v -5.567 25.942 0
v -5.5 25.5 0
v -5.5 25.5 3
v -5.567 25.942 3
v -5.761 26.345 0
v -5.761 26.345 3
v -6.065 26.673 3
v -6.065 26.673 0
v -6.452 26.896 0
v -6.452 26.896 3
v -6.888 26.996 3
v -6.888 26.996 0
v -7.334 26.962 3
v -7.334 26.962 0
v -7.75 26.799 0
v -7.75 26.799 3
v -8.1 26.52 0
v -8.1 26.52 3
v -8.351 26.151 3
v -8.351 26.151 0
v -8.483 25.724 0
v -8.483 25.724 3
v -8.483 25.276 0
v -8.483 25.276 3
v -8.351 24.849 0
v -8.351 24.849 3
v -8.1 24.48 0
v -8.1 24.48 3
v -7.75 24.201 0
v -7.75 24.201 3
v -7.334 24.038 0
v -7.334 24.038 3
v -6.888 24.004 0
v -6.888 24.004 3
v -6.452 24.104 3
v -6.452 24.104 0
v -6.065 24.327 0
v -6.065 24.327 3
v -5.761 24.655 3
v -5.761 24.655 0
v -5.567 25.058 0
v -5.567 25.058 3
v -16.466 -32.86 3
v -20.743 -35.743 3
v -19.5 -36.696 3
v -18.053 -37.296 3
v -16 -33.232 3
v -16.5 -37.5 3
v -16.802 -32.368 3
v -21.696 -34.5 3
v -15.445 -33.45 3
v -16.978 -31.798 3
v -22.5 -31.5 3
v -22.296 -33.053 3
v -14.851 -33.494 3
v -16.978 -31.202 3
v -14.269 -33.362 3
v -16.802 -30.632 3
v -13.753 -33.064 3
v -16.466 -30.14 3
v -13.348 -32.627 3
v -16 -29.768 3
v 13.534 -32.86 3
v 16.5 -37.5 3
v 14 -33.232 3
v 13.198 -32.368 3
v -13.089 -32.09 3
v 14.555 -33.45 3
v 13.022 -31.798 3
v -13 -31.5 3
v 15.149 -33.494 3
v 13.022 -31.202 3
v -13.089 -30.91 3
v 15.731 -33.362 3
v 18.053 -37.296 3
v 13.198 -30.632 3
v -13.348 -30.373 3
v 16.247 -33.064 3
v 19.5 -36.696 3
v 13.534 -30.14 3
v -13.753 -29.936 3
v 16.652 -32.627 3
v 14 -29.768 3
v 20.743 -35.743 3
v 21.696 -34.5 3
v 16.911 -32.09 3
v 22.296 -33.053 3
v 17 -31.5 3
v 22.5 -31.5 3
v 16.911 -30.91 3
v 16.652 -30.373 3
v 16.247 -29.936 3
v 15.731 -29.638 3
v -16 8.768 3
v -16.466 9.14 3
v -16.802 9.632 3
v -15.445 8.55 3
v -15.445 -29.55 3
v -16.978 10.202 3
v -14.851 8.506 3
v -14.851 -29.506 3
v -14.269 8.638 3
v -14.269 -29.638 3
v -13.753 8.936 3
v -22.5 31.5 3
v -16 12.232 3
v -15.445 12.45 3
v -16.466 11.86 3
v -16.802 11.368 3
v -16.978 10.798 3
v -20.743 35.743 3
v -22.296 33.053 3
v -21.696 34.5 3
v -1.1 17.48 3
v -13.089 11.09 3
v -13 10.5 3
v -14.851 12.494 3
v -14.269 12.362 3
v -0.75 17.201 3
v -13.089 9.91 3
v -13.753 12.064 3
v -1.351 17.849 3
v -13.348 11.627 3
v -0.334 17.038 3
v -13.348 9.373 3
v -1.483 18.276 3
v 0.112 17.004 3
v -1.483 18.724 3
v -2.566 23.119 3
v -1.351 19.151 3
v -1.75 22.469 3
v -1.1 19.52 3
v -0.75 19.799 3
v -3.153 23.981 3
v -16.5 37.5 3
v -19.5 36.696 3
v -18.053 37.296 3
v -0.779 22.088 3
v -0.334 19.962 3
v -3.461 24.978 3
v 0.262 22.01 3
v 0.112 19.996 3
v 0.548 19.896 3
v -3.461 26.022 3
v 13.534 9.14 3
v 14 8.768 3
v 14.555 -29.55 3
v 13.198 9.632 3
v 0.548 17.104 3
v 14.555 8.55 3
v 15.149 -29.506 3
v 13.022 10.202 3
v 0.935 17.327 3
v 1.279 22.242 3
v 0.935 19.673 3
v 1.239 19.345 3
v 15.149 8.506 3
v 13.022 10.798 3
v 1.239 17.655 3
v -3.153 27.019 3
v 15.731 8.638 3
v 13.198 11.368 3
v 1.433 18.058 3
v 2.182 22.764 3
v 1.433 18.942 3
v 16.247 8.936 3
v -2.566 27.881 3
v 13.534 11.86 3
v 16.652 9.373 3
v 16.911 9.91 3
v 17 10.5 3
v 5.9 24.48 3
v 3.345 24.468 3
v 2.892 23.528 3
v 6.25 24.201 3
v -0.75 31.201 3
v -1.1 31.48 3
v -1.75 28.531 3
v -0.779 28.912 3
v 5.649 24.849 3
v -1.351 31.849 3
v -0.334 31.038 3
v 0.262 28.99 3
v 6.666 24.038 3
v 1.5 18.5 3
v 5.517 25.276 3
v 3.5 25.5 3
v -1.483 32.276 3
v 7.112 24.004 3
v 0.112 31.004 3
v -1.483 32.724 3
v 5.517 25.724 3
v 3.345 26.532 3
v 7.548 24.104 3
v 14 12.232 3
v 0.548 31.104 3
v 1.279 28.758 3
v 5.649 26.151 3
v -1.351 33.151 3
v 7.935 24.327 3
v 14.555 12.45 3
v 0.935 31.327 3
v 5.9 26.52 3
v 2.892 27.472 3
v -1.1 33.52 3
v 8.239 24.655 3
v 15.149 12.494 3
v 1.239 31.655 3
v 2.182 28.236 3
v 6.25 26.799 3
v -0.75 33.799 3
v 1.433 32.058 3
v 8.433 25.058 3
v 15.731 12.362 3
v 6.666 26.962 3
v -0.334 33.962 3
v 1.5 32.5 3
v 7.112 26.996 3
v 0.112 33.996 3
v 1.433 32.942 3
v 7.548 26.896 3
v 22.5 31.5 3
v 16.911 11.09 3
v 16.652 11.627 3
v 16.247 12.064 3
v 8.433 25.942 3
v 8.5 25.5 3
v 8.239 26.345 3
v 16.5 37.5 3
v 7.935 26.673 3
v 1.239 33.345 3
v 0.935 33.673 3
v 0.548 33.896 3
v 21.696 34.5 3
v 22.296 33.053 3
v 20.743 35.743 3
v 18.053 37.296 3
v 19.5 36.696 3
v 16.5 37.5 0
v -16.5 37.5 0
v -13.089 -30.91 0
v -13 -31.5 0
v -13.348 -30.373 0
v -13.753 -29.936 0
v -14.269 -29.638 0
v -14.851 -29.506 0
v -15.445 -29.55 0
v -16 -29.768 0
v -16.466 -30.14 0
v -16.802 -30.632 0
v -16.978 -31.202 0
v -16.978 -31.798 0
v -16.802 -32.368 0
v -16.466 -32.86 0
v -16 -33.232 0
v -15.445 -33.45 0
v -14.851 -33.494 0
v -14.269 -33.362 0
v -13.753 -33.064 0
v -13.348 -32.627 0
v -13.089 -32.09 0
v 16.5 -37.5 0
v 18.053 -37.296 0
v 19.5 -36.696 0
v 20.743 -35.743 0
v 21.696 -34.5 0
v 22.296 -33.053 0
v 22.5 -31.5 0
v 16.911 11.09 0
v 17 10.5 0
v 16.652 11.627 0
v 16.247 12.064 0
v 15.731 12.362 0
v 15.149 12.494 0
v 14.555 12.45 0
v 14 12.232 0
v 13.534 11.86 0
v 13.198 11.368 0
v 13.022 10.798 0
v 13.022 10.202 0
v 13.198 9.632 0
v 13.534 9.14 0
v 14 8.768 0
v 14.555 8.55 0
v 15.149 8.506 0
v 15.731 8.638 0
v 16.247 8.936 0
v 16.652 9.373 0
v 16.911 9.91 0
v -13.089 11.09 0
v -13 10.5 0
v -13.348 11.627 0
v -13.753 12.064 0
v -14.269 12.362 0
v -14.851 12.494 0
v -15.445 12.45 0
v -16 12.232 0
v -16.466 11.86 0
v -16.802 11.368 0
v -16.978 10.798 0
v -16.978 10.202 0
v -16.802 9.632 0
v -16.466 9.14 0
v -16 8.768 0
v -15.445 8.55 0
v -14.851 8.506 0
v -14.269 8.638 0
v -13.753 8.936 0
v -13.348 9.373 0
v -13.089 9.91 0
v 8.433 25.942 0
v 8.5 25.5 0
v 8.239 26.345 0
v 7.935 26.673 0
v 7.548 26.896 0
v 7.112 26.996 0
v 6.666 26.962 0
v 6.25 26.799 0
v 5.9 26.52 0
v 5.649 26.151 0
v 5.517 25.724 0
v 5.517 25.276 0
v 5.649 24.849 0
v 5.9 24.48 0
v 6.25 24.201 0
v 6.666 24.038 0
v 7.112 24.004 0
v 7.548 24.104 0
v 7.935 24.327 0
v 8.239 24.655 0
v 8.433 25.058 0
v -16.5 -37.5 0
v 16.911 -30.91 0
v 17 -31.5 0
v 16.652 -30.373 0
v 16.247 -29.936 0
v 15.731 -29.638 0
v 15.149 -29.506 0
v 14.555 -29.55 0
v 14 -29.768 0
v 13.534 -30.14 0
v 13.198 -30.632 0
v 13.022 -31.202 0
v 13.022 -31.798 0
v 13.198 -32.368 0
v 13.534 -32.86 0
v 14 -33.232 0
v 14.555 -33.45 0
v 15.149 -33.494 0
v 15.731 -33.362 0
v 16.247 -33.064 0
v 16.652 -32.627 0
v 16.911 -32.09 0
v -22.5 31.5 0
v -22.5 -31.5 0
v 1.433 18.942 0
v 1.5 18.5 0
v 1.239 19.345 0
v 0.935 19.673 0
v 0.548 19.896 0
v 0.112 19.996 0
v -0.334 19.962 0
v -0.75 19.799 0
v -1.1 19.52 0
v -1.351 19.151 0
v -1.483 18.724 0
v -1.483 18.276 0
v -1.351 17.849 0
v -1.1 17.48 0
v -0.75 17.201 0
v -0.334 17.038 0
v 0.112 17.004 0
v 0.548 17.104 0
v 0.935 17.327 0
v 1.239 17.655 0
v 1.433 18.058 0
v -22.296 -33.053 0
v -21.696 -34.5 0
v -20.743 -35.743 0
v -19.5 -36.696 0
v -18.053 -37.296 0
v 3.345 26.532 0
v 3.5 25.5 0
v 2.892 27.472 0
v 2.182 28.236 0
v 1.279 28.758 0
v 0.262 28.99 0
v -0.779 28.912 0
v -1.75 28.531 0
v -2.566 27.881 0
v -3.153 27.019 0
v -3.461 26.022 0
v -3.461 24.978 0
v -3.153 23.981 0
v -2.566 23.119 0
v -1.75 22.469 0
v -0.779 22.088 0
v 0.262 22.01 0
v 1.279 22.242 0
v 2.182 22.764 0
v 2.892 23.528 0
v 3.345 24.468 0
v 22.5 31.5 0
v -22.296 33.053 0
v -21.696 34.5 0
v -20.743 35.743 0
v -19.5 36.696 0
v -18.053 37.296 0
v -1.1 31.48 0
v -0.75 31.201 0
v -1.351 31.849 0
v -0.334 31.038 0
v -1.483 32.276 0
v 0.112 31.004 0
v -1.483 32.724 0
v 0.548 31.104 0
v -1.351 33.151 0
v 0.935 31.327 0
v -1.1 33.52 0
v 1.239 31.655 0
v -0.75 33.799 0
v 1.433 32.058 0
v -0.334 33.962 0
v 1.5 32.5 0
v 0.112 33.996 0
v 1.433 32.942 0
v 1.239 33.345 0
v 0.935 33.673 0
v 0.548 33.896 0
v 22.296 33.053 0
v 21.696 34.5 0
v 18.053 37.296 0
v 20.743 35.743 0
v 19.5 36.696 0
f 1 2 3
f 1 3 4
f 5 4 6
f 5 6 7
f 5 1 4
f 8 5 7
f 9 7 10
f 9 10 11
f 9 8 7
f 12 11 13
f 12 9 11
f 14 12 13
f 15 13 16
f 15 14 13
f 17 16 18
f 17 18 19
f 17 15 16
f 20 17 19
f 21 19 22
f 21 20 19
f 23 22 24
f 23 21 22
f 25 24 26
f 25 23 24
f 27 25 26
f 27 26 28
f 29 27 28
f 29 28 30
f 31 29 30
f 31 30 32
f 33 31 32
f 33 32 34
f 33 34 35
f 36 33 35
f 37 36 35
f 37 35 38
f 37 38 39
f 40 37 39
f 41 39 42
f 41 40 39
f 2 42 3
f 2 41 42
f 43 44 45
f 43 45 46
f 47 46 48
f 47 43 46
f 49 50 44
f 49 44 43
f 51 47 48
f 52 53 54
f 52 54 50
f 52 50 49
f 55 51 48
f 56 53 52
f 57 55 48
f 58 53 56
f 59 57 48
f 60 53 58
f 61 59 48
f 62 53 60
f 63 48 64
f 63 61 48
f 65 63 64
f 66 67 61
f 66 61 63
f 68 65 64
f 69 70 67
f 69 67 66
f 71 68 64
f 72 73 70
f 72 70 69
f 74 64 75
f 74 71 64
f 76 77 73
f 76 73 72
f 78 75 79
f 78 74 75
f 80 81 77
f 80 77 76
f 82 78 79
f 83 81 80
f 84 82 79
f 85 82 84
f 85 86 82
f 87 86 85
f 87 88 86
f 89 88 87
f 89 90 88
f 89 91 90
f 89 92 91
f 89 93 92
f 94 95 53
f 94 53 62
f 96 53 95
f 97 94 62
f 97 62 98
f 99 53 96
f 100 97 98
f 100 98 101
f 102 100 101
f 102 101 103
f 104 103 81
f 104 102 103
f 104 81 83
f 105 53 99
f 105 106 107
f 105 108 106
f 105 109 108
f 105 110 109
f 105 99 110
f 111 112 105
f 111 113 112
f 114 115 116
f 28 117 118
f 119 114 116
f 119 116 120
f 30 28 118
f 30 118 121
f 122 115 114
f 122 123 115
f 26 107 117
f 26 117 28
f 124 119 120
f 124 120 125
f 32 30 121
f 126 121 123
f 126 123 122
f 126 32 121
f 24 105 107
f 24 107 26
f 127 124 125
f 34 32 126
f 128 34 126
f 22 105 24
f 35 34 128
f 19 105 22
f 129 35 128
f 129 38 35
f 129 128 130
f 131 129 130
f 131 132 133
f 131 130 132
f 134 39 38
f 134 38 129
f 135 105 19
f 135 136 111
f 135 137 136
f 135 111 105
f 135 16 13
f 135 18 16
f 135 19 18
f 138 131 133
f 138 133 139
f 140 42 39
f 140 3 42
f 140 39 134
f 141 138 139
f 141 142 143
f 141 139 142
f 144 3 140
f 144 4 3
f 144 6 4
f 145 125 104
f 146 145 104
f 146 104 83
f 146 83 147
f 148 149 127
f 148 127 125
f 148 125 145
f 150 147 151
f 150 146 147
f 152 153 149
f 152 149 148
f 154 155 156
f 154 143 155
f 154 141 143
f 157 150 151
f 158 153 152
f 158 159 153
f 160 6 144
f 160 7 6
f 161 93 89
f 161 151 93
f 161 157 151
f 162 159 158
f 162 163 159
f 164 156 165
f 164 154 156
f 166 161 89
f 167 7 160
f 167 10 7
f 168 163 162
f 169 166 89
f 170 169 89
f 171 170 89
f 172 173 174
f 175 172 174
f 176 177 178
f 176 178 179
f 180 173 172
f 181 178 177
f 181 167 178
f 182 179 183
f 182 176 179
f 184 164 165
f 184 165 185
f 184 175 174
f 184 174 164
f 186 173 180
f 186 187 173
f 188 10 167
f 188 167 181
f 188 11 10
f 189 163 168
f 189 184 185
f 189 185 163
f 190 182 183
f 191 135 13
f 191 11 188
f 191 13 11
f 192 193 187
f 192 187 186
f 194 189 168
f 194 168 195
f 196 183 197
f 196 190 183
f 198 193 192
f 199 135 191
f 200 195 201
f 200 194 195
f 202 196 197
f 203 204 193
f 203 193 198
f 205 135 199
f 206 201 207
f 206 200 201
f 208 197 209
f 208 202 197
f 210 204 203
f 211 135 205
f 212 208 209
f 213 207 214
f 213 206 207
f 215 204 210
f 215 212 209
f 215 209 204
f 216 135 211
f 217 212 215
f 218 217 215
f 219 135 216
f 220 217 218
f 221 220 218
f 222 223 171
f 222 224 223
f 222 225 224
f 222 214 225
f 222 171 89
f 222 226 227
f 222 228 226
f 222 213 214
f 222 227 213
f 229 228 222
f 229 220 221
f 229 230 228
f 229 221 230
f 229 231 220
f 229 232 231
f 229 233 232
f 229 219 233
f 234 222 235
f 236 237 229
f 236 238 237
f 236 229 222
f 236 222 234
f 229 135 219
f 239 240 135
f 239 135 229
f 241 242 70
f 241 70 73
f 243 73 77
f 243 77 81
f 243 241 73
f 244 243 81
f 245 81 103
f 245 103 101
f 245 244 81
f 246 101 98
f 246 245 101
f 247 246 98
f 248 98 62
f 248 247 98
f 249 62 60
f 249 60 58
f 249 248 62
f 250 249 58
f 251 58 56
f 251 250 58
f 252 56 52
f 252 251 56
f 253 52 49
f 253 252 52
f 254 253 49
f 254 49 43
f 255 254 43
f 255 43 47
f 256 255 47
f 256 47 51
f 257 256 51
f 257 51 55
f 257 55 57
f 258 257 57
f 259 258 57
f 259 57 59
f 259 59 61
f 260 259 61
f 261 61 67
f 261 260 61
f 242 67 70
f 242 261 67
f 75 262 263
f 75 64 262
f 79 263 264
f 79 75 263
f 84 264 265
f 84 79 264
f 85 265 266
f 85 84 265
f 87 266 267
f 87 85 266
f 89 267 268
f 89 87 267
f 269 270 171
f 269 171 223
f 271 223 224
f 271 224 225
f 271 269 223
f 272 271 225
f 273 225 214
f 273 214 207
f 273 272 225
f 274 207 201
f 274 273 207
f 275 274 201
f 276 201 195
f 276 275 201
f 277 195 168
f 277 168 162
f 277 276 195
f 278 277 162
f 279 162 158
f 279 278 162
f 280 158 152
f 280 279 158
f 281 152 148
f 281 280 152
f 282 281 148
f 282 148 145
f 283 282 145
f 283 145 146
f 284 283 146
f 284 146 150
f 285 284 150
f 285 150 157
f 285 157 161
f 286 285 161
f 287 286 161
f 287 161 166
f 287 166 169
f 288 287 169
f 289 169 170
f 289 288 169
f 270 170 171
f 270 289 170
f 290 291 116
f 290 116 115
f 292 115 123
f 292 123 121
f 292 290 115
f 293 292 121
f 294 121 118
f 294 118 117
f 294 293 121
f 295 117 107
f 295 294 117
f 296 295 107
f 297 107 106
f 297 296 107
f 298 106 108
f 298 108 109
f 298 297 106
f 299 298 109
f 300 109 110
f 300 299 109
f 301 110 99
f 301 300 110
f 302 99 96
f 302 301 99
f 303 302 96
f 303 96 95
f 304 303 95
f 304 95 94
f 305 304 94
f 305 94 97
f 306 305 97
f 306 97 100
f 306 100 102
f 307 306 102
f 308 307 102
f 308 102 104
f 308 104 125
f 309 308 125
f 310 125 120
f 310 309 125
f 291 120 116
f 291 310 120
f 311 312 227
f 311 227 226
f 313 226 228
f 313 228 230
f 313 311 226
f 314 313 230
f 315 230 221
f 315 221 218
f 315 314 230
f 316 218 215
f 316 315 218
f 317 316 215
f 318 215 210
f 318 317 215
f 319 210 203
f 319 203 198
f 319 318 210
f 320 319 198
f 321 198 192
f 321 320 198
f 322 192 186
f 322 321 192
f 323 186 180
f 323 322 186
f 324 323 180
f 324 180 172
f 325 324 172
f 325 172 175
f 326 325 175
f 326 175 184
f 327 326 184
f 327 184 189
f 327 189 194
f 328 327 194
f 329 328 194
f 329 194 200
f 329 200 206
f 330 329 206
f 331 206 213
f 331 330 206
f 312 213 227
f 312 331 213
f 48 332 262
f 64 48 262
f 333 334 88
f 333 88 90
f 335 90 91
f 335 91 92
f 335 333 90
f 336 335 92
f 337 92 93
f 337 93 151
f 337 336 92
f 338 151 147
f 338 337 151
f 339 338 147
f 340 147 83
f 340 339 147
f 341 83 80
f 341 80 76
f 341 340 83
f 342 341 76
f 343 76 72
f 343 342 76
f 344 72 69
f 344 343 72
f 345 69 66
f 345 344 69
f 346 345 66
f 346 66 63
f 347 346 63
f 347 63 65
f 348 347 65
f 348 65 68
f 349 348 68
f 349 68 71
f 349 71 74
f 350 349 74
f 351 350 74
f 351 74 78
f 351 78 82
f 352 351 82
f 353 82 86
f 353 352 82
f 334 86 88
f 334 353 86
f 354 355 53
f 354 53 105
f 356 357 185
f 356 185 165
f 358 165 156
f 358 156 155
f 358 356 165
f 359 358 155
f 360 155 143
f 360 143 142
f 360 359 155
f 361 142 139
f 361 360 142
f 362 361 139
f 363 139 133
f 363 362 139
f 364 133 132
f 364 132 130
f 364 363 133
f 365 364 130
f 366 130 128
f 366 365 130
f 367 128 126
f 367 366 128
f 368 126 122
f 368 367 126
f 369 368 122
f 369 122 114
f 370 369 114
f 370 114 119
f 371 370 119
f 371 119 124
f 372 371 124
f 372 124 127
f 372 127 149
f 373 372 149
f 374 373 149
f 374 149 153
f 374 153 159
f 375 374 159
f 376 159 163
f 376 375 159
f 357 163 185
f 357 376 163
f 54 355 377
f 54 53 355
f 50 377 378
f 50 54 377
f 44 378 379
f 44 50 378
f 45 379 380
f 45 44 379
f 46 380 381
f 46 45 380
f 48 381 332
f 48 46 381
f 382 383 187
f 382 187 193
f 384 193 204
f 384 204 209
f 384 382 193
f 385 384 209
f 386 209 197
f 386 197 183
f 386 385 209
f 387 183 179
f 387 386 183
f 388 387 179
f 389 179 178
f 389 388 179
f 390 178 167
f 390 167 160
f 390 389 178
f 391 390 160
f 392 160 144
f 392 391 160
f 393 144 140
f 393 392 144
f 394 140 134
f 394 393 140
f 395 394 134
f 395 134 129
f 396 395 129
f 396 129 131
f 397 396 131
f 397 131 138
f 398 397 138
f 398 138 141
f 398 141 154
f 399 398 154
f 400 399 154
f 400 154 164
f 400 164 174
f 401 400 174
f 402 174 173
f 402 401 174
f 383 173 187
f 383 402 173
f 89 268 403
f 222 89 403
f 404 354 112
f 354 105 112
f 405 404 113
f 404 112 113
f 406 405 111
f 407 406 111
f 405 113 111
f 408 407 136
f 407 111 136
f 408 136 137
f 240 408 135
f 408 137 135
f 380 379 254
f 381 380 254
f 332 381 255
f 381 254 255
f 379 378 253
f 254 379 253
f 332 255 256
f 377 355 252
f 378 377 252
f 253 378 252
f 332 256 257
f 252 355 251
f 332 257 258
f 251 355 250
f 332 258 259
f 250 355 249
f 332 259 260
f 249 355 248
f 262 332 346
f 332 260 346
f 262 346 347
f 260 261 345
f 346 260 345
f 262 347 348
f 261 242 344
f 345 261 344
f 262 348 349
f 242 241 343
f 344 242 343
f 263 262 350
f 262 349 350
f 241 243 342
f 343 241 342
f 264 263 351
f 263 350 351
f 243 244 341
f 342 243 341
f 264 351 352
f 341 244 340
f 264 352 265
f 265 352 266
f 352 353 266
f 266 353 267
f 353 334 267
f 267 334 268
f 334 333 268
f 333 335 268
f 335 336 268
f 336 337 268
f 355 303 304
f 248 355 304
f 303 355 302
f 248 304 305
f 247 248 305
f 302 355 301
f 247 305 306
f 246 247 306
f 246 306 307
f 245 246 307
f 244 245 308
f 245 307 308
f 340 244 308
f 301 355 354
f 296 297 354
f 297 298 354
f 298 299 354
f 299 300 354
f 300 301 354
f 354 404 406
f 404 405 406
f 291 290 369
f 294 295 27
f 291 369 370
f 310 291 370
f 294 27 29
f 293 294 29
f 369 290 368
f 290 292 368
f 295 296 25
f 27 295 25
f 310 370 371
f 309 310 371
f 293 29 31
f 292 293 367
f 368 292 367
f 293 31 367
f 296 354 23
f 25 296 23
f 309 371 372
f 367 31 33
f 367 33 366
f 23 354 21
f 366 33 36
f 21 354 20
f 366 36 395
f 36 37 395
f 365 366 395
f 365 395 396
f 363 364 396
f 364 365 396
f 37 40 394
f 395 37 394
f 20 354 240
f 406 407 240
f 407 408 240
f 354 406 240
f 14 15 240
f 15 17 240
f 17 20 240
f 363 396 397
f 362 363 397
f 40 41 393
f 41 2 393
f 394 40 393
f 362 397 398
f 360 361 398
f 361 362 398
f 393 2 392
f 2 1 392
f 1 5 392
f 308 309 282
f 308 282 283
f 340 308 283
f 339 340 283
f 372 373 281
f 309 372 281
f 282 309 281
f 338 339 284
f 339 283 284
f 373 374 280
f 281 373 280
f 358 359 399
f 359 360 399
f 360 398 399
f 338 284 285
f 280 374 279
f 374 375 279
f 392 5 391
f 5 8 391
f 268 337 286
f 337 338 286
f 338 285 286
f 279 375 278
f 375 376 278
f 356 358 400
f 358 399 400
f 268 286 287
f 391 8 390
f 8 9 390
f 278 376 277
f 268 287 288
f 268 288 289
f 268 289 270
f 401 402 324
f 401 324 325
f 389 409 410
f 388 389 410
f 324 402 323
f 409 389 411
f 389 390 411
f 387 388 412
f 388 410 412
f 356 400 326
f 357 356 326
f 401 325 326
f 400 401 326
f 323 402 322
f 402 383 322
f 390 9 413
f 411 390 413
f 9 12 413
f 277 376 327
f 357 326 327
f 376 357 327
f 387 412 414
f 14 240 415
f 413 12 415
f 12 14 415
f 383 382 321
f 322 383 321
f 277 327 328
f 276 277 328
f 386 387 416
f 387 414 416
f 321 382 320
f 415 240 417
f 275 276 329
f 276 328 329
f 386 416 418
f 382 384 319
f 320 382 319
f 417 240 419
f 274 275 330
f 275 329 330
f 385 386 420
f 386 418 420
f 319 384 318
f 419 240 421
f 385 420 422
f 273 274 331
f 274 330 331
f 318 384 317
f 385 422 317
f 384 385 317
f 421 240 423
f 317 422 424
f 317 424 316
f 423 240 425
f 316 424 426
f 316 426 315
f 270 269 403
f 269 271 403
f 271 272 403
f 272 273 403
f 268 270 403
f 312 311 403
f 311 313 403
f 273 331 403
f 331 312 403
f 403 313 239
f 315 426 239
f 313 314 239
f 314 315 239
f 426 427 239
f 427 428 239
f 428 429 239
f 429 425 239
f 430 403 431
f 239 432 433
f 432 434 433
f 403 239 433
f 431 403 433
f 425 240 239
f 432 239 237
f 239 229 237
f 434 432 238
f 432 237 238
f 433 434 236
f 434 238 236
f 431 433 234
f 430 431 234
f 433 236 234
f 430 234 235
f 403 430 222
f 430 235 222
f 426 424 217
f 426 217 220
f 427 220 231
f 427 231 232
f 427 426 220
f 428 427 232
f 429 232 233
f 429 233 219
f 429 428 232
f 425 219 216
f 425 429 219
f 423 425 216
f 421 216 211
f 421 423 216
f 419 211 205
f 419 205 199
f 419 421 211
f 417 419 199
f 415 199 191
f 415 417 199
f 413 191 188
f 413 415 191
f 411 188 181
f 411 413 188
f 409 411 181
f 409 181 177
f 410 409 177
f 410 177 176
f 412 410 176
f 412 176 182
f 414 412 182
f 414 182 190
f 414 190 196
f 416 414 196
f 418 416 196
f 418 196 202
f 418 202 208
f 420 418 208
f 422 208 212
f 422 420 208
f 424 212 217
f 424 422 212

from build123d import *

# Parameters (mm, degrees)
SKETCH_1_W      = 45
SKETCH_1_H      = 75
SKETCH_1_R      = 2
SKETCH_1_R_2    = 1.5
SKETCH_1_R_3    = 3.5
EXTRUDE_1_DEPTH = 3
FILLET_1_R      = 6


with BuildPart() as part:
    # 草图1 → 凸台-拉伸1 (new body)
    with BuildSketch(Plane.XY):
        Rectangle(SKETCH_1_W, SKETCH_1_H)
        with Locations((-15, 10.5)):
            Circle(SKETCH_1_R, mode=Mode.SUBTRACT)
        with Locations((15, 10.5)):
            Circle(SKETCH_1_R, mode=Mode.SUBTRACT)
        with Locations((15, -31.5)):
            Circle(SKETCH_1_R, mode=Mode.SUBTRACT)
        with Locations((-15, -31.5)):
            Circle(SKETCH_1_R, mode=Mode.SUBTRACT)
        with Locations((0, 32.5)):
            Circle(SKETCH_1_R_2, mode=Mode.SUBTRACT)
        with Locations((7, 25.5)):
            Circle(SKETCH_1_R_2, mode=Mode.SUBTRACT)
        with Locations((0, 18.5)):
            Circle(SKETCH_1_R_2, mode=Mode.SUBTRACT)
        with Locations((-7, 25.5)):
            Circle(SKETCH_1_R_2, mode=Mode.SUBTRACT)
        with Locations((0, 25.5)):
            Circle(SKETCH_1_R_3, mode=Mode.SUBTRACT)
    extrude(amount=EXTRUDE_1_DEPTH)

    # 圆角1
    fillet_1_edges = [part.edges().sort_by_distance(p)[0] for p in [
        (22.5, -37.5, 1.5),
        (-22.5, -37.5, 1.5),
        (-22.5, 37.5, 1.5),
        (22.5, 37.5, 1.5),
    ]]
    fillet(fillet_1_edges, radius=FILLET_1_R)


solid = part.part
